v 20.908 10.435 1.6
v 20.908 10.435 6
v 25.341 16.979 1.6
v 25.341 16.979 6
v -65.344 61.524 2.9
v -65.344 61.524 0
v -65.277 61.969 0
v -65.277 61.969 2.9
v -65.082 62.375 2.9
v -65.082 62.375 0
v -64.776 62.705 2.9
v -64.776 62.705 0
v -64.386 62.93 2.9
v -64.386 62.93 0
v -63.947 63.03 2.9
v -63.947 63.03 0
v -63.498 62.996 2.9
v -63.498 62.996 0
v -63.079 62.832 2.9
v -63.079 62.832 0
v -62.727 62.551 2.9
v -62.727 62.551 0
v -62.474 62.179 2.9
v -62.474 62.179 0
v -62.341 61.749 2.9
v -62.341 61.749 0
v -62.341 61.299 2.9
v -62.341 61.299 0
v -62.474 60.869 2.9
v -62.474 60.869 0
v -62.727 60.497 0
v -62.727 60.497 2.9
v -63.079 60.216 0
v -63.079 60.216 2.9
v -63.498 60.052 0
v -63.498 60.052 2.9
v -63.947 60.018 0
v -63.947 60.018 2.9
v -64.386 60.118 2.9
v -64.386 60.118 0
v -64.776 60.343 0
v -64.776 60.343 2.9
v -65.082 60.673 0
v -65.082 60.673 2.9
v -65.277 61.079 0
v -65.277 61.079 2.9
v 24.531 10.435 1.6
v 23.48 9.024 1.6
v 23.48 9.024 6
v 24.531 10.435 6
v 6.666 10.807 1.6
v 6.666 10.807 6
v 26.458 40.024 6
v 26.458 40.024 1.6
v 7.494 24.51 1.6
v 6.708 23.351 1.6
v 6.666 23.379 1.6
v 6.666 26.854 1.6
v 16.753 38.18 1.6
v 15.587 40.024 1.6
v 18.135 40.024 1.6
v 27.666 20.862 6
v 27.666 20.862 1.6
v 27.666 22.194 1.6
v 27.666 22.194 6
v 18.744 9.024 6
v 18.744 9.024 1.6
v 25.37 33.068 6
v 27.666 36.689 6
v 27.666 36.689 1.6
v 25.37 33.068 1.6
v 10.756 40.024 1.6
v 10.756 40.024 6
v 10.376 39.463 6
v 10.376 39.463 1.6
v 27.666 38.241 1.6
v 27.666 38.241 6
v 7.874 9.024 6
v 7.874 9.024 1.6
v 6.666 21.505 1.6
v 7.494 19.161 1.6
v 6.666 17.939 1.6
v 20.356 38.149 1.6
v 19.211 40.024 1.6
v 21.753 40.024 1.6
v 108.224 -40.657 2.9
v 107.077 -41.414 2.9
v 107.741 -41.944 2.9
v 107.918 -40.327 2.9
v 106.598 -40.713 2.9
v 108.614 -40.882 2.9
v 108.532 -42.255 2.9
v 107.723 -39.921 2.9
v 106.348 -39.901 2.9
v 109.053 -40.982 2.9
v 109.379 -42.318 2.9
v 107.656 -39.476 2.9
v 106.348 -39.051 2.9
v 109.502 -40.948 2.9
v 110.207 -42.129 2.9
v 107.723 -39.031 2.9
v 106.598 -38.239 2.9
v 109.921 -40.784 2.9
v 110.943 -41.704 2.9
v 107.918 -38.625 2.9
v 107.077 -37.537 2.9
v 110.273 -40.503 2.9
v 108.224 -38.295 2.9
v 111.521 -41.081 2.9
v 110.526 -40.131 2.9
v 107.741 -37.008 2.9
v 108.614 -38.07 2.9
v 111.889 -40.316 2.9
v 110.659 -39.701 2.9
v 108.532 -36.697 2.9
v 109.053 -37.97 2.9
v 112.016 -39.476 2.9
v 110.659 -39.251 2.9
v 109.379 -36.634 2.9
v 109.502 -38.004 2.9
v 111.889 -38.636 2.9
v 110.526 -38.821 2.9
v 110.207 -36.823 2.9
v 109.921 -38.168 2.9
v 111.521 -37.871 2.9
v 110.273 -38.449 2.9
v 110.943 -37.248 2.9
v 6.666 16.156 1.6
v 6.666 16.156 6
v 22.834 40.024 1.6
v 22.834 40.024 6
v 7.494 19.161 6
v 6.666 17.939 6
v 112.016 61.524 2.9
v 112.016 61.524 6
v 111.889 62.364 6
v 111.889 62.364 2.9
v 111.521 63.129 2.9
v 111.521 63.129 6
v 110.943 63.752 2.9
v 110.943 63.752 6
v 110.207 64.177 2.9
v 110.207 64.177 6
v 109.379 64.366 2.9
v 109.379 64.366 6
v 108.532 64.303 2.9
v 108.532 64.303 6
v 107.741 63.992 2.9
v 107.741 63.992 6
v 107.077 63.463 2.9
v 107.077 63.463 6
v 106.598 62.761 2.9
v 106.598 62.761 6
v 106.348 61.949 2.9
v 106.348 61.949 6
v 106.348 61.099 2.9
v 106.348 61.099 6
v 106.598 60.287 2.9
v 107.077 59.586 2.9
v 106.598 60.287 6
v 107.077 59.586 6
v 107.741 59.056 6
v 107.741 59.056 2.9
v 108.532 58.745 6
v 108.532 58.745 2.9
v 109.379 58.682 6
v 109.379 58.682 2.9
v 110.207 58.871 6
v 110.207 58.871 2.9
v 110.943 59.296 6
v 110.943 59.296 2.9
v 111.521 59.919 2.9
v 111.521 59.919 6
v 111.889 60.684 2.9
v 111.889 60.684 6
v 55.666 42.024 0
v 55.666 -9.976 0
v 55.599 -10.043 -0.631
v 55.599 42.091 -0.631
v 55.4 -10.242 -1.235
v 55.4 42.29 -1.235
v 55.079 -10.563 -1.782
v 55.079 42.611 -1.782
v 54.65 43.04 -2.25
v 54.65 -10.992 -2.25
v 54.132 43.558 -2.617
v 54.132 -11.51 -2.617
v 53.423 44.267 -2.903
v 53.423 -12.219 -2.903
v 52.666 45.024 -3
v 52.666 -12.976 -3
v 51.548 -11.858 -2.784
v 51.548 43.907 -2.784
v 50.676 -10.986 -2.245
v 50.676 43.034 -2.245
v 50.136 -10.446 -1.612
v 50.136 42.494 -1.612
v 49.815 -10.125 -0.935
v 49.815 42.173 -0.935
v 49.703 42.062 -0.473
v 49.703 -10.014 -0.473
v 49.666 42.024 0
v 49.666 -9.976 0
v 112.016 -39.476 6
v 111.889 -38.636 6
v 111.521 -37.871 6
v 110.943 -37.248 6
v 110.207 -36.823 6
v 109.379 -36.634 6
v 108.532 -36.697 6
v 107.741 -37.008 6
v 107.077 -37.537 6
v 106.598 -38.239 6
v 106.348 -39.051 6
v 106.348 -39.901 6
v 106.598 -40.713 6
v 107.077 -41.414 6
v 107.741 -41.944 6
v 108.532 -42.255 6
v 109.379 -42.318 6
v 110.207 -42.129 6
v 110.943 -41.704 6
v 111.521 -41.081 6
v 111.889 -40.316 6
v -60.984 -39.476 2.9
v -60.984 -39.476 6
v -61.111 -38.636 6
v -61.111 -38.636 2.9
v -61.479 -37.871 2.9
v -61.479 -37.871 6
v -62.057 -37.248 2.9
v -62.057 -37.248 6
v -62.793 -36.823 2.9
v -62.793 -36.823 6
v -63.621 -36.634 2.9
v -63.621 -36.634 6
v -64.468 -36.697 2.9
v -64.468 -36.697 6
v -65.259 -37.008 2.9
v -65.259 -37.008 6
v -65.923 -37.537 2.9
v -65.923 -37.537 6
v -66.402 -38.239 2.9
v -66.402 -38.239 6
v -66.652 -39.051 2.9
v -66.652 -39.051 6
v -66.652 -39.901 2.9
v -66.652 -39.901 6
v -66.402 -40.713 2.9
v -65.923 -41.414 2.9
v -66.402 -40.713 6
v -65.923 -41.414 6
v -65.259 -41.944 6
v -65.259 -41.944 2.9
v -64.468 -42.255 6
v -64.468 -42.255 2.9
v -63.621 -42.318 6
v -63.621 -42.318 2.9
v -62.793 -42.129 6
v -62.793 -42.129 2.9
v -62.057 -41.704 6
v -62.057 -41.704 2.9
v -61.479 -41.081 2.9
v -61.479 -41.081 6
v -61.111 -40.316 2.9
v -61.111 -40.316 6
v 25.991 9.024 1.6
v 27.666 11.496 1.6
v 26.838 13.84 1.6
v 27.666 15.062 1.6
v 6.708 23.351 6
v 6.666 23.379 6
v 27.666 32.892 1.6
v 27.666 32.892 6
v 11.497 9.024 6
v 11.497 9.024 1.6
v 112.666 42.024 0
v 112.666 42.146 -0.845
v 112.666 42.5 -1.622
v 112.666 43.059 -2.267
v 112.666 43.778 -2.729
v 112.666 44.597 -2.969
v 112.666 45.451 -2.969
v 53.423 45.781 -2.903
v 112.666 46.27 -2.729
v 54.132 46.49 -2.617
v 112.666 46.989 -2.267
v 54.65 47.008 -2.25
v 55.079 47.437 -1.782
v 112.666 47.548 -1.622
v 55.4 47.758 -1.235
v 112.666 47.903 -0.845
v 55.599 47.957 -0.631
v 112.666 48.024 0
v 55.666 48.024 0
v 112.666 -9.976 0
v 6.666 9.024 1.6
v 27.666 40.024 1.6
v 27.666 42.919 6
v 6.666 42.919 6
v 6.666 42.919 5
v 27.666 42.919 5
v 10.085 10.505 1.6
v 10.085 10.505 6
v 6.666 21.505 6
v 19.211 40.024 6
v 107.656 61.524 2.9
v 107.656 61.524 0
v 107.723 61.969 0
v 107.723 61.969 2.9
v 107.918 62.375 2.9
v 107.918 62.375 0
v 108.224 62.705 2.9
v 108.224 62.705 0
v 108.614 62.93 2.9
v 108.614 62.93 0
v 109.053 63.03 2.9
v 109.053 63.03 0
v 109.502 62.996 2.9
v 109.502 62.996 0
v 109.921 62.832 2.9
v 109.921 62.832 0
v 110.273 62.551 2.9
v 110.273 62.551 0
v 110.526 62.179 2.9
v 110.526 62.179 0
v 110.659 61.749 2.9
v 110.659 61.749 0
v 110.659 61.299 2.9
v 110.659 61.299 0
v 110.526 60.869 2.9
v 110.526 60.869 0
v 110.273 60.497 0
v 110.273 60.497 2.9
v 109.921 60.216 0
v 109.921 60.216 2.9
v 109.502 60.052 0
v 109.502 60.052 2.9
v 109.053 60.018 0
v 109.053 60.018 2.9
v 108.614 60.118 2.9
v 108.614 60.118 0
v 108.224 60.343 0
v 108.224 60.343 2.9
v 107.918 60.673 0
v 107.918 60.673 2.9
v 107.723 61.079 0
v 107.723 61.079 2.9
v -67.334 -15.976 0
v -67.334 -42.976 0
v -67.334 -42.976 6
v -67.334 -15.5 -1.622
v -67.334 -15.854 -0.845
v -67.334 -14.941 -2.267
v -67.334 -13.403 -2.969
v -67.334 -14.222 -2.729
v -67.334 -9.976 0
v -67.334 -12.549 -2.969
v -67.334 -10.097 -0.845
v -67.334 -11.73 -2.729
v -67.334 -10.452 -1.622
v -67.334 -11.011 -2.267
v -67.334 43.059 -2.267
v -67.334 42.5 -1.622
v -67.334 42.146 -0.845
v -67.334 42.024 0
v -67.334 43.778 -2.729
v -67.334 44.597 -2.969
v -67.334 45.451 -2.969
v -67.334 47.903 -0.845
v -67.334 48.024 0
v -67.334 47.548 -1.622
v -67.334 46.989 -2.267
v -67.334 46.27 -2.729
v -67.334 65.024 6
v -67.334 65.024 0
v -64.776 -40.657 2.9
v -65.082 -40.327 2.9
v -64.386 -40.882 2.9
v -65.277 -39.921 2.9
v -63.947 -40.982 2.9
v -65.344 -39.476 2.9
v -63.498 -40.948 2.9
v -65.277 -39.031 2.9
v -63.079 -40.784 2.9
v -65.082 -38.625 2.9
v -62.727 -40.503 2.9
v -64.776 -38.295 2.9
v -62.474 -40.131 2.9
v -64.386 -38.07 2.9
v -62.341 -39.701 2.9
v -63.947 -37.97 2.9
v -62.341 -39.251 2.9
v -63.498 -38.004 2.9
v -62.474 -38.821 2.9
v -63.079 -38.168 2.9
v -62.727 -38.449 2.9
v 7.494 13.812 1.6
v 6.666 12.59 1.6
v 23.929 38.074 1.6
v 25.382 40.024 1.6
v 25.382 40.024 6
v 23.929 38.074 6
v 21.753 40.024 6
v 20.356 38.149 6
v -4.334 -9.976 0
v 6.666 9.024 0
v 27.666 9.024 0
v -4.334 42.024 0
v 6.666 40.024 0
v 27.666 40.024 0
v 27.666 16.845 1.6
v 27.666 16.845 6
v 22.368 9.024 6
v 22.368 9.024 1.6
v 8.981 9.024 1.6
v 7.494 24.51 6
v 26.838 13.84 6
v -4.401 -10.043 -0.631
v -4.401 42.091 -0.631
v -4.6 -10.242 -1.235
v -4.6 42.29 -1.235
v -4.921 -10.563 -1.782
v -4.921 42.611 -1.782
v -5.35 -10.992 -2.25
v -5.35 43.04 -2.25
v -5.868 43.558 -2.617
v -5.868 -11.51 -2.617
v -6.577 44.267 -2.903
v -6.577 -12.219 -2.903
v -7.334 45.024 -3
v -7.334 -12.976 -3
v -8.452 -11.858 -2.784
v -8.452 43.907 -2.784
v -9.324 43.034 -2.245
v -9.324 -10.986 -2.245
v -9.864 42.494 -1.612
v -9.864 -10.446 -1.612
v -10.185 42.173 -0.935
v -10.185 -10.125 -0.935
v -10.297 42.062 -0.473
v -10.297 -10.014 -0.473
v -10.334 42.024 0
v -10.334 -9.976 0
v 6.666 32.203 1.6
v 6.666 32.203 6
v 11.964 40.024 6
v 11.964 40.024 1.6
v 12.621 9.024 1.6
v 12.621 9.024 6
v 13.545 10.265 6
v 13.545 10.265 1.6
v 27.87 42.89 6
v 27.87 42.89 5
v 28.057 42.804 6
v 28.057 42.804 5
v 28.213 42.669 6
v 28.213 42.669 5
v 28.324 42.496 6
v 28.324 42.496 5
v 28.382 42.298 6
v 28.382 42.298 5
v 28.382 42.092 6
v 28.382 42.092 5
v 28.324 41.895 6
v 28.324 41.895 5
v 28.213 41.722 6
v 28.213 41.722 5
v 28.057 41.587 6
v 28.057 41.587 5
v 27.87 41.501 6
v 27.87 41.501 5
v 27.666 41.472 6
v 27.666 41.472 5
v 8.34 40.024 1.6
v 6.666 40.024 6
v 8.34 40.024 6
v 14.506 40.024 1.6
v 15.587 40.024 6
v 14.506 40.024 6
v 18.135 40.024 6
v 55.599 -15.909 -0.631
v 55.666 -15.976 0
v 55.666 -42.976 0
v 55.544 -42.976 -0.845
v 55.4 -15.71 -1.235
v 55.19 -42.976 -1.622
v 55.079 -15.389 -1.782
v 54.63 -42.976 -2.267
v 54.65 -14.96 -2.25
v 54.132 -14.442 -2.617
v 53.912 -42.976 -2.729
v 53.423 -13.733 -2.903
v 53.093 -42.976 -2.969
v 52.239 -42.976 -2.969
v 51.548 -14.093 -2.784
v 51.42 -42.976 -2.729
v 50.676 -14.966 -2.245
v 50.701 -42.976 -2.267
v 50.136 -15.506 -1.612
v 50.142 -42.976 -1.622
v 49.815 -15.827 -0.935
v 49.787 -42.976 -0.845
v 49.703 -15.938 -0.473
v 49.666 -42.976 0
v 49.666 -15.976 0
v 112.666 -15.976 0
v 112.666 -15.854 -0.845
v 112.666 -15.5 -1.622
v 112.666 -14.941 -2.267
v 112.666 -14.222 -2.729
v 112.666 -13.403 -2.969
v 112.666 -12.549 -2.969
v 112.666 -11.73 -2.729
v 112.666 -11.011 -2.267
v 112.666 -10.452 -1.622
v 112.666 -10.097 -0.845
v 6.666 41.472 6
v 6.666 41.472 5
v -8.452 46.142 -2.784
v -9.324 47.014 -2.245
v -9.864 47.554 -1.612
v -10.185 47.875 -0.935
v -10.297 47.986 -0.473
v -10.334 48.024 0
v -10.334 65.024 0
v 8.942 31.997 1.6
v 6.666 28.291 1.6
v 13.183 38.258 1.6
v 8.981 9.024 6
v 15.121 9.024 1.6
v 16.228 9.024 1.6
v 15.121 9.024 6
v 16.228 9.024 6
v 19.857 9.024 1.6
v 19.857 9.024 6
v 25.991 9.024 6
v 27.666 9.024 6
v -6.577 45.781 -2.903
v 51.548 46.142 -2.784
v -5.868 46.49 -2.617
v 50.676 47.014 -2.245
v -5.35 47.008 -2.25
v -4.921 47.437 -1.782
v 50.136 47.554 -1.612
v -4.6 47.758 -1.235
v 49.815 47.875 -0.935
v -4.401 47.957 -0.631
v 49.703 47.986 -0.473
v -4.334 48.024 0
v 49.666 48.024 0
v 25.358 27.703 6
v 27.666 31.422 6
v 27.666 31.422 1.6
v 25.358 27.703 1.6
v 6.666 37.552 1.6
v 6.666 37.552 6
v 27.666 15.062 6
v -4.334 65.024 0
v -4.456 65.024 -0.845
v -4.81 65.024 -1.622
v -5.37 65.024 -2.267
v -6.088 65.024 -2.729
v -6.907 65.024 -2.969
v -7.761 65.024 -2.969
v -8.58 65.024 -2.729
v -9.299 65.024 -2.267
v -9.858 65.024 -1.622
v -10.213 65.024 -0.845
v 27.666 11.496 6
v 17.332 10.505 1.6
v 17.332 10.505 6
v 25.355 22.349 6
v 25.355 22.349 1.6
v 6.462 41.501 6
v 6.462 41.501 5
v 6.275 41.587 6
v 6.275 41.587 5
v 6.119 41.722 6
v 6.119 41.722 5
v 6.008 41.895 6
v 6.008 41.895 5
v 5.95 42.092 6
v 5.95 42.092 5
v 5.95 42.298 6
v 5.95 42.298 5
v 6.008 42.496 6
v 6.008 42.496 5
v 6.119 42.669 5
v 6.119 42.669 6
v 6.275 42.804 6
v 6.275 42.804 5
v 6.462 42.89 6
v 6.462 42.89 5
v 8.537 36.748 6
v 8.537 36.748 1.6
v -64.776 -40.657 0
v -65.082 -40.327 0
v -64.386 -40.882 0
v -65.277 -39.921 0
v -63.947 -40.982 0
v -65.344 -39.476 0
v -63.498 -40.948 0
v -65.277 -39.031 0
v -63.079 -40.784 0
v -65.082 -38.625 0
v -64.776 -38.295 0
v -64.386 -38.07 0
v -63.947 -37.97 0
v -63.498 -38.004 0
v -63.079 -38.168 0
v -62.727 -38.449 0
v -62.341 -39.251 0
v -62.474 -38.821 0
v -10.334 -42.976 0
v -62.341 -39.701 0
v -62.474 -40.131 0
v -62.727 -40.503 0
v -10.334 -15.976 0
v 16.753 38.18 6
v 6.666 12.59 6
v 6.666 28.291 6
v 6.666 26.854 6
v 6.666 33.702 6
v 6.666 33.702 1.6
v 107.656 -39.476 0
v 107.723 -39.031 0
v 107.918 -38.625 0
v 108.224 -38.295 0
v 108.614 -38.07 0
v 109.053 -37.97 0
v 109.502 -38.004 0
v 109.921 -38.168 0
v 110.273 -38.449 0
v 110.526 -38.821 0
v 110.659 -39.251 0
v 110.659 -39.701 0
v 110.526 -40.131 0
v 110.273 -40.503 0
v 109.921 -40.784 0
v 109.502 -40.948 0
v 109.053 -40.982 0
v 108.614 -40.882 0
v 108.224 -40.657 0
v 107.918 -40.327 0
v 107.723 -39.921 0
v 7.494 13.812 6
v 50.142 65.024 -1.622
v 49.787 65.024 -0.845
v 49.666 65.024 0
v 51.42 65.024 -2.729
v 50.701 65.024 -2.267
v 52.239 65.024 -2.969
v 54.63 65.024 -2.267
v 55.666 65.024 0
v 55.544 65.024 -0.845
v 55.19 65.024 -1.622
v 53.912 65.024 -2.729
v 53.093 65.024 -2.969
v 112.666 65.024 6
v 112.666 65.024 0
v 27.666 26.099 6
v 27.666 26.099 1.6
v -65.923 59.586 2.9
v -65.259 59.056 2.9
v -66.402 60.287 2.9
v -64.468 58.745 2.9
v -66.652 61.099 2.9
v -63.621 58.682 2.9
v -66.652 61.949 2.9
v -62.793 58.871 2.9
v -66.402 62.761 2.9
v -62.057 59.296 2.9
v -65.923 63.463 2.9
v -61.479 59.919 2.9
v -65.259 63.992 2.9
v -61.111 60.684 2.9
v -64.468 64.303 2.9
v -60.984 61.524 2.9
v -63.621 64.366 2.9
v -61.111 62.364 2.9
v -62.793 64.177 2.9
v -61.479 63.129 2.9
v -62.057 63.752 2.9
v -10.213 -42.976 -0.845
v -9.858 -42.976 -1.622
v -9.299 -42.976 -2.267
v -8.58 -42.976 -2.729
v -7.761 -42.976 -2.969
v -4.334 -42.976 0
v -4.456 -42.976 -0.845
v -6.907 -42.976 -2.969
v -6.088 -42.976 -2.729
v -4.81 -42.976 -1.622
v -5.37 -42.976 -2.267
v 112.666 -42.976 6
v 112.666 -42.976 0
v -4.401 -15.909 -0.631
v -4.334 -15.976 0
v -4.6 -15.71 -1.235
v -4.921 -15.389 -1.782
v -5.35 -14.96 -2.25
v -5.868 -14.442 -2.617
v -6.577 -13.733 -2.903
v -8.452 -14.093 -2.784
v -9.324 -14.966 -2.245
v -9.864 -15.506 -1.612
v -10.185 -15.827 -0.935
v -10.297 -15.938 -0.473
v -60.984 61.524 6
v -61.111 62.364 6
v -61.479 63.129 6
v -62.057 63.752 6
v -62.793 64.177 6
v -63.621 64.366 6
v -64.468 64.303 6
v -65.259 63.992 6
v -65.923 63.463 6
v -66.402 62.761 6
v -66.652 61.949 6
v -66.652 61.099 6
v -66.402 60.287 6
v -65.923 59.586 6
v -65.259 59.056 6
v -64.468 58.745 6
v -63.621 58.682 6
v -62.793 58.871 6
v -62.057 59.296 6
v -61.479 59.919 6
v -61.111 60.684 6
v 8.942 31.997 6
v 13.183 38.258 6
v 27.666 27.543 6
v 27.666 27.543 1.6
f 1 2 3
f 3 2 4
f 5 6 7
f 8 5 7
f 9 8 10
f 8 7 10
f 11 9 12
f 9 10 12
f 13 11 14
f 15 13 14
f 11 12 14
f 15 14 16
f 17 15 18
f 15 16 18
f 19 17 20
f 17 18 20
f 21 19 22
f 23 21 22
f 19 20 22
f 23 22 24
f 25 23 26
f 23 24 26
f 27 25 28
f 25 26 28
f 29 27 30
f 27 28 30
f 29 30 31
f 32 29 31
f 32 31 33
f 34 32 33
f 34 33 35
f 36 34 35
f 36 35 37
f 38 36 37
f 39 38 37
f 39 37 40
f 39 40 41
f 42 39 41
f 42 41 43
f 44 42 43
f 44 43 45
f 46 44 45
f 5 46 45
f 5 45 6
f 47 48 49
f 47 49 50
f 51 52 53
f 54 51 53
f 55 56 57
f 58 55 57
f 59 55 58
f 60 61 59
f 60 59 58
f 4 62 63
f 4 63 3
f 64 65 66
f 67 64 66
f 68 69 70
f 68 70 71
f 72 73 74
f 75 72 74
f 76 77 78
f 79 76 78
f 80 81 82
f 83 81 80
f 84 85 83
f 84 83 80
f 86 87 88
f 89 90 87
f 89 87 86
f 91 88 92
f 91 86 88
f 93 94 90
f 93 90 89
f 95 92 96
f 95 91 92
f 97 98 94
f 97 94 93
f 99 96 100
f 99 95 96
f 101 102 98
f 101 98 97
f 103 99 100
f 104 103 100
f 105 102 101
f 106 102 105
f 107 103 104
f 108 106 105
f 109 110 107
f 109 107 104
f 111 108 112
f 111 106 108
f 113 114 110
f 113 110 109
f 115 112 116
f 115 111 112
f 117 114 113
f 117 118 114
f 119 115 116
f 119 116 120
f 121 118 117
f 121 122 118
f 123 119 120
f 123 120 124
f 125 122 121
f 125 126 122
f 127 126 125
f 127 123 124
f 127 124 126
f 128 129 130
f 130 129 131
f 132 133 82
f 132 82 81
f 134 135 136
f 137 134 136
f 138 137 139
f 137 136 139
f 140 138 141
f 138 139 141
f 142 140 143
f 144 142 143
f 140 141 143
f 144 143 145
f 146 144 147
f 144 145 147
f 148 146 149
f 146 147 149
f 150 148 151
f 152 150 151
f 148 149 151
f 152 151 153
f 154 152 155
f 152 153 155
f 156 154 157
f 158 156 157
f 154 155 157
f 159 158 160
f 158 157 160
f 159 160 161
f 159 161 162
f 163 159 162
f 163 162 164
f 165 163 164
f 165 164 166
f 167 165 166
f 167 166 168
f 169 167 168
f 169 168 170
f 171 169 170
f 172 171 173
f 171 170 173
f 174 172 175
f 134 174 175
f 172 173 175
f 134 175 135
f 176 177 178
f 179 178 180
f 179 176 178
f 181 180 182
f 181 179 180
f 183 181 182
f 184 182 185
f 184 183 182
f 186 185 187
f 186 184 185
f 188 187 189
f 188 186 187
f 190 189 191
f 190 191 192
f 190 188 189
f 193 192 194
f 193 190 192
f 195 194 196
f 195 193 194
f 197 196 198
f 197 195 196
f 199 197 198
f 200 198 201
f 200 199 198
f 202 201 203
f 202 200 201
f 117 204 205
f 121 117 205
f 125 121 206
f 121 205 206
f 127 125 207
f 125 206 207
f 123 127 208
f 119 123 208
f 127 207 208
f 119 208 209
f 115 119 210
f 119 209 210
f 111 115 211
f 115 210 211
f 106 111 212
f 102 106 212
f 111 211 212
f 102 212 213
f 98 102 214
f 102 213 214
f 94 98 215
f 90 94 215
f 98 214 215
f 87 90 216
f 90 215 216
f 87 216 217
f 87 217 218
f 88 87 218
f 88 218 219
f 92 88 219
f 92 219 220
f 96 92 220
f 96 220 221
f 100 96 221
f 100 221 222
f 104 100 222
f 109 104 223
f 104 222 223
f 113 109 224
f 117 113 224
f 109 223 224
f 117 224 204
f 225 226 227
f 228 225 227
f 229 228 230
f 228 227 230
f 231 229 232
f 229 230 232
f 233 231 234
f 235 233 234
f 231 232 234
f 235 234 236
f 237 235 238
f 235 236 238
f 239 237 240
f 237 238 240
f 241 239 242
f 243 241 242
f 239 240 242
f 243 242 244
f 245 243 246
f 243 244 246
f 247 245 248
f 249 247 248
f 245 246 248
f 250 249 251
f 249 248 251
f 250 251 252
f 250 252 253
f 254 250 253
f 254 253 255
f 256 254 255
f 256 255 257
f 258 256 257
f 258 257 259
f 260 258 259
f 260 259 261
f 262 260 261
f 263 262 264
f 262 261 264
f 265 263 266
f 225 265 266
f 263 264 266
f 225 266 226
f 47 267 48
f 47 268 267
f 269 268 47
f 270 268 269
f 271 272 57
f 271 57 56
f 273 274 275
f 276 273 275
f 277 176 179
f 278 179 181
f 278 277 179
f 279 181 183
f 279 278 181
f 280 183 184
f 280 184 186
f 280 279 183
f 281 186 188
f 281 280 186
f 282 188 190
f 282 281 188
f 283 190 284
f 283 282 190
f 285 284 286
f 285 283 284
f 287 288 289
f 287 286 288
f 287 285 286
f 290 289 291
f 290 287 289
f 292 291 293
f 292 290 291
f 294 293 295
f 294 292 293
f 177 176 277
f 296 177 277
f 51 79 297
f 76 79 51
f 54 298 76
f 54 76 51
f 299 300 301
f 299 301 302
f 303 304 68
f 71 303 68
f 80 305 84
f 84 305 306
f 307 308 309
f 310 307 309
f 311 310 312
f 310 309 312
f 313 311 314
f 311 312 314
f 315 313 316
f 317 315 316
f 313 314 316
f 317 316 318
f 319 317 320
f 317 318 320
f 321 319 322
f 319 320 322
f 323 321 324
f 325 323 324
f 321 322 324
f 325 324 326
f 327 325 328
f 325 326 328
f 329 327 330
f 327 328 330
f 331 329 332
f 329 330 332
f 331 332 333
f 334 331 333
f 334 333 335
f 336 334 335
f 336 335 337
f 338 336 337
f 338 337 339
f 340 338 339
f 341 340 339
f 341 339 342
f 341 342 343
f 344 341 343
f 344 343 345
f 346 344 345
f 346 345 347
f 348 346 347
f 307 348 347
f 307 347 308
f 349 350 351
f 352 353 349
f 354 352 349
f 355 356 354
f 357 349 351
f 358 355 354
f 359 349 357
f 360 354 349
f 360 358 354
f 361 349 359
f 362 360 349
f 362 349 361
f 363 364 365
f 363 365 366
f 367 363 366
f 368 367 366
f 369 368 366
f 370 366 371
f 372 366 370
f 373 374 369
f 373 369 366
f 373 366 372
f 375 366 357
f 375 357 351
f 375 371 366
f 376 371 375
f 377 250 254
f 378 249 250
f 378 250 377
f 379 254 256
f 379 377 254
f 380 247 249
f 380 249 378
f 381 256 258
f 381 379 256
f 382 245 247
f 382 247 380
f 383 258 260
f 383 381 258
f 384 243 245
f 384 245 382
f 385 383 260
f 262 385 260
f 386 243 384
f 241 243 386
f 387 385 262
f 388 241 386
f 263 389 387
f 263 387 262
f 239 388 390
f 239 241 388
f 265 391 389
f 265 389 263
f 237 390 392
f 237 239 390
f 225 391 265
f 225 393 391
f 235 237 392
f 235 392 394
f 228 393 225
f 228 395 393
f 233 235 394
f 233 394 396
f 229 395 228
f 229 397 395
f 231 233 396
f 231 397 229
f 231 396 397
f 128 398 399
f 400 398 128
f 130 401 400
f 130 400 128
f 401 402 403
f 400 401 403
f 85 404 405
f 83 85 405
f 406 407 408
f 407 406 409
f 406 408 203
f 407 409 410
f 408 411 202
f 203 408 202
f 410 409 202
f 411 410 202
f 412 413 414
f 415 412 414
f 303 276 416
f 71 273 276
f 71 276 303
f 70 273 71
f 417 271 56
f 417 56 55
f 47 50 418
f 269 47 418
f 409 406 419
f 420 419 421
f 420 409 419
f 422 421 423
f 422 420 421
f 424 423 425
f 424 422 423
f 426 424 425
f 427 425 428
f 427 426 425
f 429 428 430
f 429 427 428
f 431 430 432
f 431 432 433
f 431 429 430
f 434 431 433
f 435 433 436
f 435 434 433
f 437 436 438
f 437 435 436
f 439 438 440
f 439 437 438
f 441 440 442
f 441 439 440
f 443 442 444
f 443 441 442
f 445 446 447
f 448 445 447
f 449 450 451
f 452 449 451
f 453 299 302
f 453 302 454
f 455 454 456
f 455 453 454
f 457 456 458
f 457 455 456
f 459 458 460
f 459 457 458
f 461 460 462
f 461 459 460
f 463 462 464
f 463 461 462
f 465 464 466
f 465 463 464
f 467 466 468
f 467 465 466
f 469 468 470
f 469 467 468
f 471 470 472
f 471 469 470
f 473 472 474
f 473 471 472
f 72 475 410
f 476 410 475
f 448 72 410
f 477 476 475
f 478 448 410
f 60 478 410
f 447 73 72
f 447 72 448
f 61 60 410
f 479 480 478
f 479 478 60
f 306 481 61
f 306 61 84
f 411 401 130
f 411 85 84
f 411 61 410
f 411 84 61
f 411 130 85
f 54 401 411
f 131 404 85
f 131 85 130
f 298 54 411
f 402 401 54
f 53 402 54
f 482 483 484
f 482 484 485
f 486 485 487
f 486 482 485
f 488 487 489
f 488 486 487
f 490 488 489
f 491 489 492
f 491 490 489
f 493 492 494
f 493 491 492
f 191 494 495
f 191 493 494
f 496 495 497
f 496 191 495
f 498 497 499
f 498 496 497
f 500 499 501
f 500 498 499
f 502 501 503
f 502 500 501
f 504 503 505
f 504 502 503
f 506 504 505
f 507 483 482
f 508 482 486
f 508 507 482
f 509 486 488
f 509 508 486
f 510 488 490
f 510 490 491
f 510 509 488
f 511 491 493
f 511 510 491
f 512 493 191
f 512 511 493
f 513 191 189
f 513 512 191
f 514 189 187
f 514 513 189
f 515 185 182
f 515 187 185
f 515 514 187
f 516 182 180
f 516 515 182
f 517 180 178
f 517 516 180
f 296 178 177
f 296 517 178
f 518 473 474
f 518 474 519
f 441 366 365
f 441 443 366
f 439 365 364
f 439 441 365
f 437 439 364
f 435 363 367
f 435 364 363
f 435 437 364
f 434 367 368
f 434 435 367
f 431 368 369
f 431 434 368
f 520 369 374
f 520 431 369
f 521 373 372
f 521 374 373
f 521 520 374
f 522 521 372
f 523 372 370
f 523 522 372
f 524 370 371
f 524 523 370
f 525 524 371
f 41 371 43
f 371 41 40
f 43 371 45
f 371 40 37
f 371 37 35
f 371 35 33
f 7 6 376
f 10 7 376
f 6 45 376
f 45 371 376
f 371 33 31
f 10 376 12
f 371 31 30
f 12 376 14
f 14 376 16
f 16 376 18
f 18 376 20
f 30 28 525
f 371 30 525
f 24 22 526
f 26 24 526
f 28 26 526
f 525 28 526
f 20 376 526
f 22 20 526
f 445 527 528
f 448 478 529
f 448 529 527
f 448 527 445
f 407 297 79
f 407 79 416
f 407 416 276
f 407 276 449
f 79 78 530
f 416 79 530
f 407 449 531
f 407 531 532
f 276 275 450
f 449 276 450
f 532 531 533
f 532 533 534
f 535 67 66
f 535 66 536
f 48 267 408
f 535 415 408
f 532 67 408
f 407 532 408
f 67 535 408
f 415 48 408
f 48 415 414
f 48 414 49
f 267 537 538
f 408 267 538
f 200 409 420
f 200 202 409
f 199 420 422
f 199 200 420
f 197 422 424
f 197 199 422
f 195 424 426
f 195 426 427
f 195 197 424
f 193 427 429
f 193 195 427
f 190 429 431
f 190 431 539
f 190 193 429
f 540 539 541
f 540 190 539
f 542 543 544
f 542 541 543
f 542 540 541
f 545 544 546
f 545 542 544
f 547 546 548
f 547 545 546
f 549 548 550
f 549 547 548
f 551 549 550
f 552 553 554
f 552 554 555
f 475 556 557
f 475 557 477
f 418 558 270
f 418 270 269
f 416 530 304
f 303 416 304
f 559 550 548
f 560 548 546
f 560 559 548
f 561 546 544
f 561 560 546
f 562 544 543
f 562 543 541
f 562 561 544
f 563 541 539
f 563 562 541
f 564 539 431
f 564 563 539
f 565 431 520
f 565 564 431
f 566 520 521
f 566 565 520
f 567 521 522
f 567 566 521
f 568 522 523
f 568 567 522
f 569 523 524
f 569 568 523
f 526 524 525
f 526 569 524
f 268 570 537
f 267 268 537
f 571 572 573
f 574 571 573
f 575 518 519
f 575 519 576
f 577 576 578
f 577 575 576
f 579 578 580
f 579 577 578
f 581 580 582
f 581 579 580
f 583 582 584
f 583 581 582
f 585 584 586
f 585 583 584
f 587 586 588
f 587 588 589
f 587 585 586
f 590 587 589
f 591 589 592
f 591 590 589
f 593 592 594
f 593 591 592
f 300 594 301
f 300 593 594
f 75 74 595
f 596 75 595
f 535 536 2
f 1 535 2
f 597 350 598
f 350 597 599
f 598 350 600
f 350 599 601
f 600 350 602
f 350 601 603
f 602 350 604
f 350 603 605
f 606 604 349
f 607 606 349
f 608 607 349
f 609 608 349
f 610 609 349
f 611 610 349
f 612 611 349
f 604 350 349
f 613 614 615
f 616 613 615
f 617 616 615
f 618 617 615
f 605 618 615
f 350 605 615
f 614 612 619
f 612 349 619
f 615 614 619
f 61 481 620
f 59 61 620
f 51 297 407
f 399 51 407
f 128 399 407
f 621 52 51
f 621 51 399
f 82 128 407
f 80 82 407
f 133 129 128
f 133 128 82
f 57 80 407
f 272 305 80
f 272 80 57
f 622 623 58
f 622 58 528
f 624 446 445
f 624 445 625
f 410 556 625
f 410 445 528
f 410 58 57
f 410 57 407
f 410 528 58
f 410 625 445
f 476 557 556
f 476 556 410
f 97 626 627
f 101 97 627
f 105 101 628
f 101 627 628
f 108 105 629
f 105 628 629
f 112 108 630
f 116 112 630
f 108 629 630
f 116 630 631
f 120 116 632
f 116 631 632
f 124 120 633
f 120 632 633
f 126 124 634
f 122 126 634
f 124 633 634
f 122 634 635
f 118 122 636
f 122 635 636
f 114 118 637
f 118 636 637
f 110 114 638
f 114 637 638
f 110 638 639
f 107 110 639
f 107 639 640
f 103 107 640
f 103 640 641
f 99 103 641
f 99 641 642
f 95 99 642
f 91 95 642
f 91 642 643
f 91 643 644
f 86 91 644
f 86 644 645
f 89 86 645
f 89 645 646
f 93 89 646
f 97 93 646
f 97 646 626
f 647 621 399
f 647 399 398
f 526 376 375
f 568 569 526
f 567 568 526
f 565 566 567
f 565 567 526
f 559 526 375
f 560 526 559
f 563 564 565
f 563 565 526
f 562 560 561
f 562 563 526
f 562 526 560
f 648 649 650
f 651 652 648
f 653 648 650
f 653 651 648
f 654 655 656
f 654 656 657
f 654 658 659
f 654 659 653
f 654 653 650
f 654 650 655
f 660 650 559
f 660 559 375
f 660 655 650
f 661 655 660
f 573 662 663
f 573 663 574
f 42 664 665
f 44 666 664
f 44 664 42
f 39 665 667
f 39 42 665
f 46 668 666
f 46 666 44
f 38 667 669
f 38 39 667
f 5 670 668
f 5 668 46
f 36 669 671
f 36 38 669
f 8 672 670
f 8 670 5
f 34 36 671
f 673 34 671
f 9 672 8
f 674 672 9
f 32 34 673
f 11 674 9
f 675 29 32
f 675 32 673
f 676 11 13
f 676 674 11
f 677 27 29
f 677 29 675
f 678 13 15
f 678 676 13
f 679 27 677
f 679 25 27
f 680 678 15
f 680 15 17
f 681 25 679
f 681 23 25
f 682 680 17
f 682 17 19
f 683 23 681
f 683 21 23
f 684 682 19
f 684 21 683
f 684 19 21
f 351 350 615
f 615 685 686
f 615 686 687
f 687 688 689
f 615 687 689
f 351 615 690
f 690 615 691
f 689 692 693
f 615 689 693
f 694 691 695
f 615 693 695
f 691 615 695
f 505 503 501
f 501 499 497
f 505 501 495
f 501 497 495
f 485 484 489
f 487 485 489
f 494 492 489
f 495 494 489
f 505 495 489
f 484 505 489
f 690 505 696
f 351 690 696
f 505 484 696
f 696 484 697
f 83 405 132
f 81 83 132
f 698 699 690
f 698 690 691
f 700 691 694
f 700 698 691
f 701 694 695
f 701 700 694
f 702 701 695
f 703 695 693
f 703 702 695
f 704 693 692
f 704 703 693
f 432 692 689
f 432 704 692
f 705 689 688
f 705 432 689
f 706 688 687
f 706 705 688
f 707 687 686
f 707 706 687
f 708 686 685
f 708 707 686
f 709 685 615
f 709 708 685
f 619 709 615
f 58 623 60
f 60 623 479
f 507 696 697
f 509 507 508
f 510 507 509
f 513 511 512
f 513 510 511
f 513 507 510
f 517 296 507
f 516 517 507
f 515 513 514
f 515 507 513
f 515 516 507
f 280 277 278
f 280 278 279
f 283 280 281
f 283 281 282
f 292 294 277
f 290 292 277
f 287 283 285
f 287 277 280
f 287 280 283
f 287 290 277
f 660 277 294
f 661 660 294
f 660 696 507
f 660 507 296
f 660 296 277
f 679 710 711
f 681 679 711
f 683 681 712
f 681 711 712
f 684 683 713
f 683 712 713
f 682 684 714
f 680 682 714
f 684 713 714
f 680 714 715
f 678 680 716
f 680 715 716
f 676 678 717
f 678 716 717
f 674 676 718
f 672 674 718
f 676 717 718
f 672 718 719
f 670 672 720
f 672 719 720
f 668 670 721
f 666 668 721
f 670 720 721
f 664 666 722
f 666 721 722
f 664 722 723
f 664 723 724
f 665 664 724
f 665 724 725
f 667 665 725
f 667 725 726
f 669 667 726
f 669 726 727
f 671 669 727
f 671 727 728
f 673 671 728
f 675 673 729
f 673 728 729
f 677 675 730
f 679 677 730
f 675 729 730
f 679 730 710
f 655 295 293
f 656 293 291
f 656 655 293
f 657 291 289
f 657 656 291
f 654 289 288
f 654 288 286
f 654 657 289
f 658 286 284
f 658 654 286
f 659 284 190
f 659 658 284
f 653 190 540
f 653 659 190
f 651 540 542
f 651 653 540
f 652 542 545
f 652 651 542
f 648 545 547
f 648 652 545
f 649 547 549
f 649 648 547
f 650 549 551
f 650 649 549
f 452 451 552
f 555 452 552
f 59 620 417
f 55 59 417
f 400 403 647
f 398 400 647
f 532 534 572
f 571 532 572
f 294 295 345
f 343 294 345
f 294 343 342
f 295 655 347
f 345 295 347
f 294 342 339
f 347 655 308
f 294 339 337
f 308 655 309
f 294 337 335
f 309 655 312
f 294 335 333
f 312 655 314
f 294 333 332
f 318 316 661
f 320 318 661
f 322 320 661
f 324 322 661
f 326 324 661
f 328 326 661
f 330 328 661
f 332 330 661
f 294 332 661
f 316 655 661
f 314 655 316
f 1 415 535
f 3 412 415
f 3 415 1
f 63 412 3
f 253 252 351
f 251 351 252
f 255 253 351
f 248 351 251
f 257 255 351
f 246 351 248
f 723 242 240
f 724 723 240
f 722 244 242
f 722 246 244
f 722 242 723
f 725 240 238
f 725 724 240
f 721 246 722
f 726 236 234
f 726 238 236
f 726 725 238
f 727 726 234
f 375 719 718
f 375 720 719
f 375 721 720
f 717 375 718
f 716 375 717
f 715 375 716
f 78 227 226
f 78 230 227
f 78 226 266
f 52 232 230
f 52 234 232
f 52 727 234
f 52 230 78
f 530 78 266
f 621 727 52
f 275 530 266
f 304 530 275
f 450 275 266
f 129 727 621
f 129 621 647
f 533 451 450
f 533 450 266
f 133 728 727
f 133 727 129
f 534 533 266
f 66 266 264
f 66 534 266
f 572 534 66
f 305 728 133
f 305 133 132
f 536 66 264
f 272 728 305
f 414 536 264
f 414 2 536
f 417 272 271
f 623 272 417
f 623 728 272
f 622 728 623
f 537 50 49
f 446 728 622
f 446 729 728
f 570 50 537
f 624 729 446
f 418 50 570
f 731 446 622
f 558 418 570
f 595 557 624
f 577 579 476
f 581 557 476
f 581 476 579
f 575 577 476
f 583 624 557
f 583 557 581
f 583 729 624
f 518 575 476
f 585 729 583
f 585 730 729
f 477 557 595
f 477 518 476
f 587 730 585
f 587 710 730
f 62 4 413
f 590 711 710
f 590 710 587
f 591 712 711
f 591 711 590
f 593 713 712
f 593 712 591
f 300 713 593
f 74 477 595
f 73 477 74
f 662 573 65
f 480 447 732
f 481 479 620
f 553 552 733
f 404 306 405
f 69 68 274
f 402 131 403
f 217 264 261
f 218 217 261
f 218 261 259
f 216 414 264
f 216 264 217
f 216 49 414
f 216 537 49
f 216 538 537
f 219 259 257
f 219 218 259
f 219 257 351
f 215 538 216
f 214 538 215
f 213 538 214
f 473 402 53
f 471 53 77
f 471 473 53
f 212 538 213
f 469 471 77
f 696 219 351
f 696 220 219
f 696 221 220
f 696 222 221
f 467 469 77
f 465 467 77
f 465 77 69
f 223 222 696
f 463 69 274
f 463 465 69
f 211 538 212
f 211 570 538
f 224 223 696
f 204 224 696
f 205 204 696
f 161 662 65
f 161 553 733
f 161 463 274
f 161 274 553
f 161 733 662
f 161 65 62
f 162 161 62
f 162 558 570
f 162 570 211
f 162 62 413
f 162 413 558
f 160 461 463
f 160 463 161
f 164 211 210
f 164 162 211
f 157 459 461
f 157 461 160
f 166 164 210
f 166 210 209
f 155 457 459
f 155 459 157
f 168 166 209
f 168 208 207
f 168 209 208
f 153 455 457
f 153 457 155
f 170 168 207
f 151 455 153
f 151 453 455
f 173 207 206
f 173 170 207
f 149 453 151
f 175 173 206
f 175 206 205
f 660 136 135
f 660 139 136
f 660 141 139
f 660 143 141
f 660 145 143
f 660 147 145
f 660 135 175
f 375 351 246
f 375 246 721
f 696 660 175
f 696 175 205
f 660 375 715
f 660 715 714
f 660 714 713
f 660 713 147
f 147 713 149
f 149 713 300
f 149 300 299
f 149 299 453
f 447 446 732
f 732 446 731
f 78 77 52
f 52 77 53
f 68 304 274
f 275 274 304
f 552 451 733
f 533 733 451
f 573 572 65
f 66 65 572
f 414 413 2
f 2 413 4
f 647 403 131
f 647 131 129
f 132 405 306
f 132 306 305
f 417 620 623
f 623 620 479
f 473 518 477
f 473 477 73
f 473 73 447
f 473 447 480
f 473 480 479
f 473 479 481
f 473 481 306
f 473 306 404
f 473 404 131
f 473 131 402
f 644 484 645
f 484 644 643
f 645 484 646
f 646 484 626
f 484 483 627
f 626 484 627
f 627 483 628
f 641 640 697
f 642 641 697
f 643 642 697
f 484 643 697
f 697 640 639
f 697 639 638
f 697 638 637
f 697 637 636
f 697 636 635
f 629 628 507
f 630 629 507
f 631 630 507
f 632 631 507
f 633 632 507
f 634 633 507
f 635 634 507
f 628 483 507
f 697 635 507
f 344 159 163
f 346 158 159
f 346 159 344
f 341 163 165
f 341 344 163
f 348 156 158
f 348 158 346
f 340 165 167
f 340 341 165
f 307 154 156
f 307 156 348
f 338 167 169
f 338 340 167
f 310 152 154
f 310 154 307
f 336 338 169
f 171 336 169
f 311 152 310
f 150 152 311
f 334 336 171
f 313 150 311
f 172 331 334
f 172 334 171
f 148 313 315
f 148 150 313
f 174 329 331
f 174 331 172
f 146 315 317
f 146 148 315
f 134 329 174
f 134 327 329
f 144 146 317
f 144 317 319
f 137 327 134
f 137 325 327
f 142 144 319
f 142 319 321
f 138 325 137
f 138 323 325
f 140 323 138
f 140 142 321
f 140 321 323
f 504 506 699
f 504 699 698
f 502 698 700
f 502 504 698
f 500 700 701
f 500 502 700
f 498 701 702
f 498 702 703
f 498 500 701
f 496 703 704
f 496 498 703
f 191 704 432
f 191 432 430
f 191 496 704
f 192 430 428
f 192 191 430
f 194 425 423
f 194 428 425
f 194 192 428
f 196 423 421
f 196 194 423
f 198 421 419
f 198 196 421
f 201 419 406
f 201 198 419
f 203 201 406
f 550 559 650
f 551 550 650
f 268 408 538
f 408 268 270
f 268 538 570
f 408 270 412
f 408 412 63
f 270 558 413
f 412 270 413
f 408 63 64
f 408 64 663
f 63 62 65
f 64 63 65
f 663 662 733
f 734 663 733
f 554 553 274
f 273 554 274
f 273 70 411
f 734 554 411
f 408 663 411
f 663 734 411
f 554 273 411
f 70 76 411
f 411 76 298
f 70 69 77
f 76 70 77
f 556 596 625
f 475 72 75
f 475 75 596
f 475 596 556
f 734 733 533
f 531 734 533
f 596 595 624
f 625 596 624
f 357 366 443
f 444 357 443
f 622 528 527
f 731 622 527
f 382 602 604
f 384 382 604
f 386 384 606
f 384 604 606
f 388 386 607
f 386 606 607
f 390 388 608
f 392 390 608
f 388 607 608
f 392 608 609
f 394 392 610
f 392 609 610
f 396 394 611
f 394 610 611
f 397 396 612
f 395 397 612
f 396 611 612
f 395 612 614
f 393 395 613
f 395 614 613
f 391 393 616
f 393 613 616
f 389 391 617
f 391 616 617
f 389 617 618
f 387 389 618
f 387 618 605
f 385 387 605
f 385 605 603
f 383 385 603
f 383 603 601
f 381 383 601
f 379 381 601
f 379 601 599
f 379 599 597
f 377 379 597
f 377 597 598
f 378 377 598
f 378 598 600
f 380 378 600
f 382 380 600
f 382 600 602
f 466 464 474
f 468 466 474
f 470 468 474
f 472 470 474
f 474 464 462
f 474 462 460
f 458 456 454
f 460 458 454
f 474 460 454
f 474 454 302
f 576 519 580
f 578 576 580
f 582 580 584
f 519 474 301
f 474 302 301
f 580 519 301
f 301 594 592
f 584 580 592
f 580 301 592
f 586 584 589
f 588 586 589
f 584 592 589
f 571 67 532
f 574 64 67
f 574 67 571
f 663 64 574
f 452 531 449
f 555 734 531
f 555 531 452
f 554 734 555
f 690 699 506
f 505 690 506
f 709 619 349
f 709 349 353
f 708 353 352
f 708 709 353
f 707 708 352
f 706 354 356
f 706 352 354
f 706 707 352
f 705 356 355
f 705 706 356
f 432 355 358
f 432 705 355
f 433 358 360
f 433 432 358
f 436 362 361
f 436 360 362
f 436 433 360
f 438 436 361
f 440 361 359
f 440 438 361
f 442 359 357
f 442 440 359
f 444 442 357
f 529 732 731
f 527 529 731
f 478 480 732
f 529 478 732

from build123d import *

# Parameters (mm, degrees)
SKETCH_1_W           = 180
SKETCH_1_H           = 108
EXTRUDE_4_DEPTH      = 6
SKETCH_3_R           = 2.85
EXTRUDE_8_DEPTH      = 5.7
SKETCH_4_R           = 2.85
EXTRUDE_9_DEPTH      = 3.1
SKETCH_5_R           = 2.85
CUT_EXTRUDE_1_DEPTH  = 3.1
SKETCH_7_R           = 2.85
CUT_EXTRUDE_2_DEPTH  = 3.1
SKETCH_8_R           = 2.85
CUT_EXTRUDE_3_DEPTH  = 3.1
SKETCH_9_R           = 2.85
CUT_EXTRUDE_4_DEPTH  = 3.1
SKETCH_10_R          = 1.51
CUT_EXTRUDE_5_DEPTH  = 3.1
SKETCH_11_R          = 1.51
CUT_EXTRUDE_6_DEPTH  = 3.1
SKETCH_12_R          = 1.51
CUT_EXTRUDE_7_DEPTH  = 3.1
SKETCH_13_R          = 1.51
CUT_EXTRUDE_8_DEPTH  = 3.1
SKETCH_14_W          = 21
SKETCH_14_H          = 31
CUT_EXTRUDE_10_DEPTH = 10
CUT_EXTRUDE_12_DEPTH = 1
EXTRUDE_10_DEPTH     = 4.4
EXTRUDE_12_DEPTH     = 4.4
SKETCH_18_R          = 3
EXTRUDE_15_DEPTH     = 108
SKETCH_21_R          = 3
EXTRUDE_16_DEPTH     = 180


with BuildPart() as part:
    # 草图1 → 凸台-拉伸4 (new body)
    with BuildSketch(Plane.XY):
        with Locations((22.665747166, 11.024023211)):
            Rectangle(SKETCH_1_W, SKETCH_1_H)
    extrude(amount=EXTRUDE_4_DEPTH)

    # 草图3 → 凸台-拉伸8 (add)
    with BuildSketch(Plane.XY.offset(6)):
        with Locations((109.165747166, 61.524023211)):
            Circle(SKETCH_3_R)
    extrude(amount=-EXTRUDE_8_DEPTH)

    # 草图4 → 凸台-拉伸9 (add)
    with BuildSketch(Plane.XY.offset(6)):
        with Locations((-63.834252834, 61.524023211)):
            Circle(SKETCH_4_R)
    extrude(amount=-EXTRUDE_9_DEPTH)

    # 草图5 → 切除-拉伸1 (cut)
    with BuildSketch(Plane.XY.offset(6)):
        with Locations((-63.834252834, 61.524023211)):
            Circle(SKETCH_5_R)
    extrude(amount=-CUT_EXTRUDE_1_DEPTH, mode=Mode.SUBTRACT)

    # 草图7 → 切除-拉伸2 (cut)
    with BuildSketch(Plane.XY.offset(6)):
        with Locations((109.165747166, 61.524023211)):
            Circle(SKETCH_7_R)
    extrude(amount=-CUT_EXTRUDE_2_DEPTH, mode=Mode.SUBTRACT)

    # 草图8 → 切除-拉伸3 (cut)
    with BuildSketch(Plane.XY.offset(6)):
        with Locations((-63.834252834, -39.475976789)):
            Circle(SKETCH_8_R)
    extrude(amount=-CUT_EXTRUDE_3_DEPTH, mode=Mode.SUBTRACT)

    # 草图9 → 切除-拉伸4 (cut)
    with BuildSketch(Plane.XY.offset(6)):
        with Locations((109.165747166, -39.475976789)):
            Circle(SKETCH_9_R)
    extrude(amount=-CUT_EXTRUDE_4_DEPTH, mode=Mode.SUBTRACT)

    # 草图10 → 切除-拉伸5 (cut)
    with BuildSketch(Plane(origin=(0, 0, 0), x_dir=(-1, 0, 0), z_dir=(0, 0, -1))):
        with Locations((-109.165747166, 61.524023211)):
            Circle(SKETCH_10_R)
    extrude(amount=-CUT_EXTRUDE_5_DEPTH, mode=Mode.SUBTRACT)

    # 草图11 → 切除-拉伸6 (cut)
    with BuildSketch(Plane(origin=(0, 0, 0), x_dir=(-1, 0, 0), z_dir=(0, 0, -1))):
        with Locations((-109.165747166, -39.475976789)):
            Circle(SKETCH_11_R)
    extrude(amount=-CUT_EXTRUDE_6_DEPTH, mode=Mode.SUBTRACT)

    # 草图12 → 切除-拉伸7 (cut)
    with BuildSketch(Plane(origin=(0, 0, 0), x_dir=(-1, 0, 0), z_dir=(0, 0, -1))):
        with Locations((63.834252834, 61.524023211)):
            Circle(SKETCH_12_R)
    extrude(amount=-CUT_EXTRUDE_7_DEPTH, mode=Mode.SUBTRACT)

    # 草图13 → 切除-拉伸8 (cut)
    with BuildSketch(Plane(origin=(0, 0, 0), x_dir=(-1, 0, 0), z_dir=(0, 0, -1))):
        with Locations((63.834252834, -39.475976789)):
            Circle(SKETCH_13_R)
    extrude(amount=-CUT_EXTRUDE_8_DEPTH, mode=Mode.SUBTRACT)

    # 草图14 → 切除-拉伸10 (cut)
    with BuildSketch(Plane.XY.offset(6)):
        with Locations((17.165747166, 24.524023211)):
            Rectangle(SKETCH_14_W, SKETCH_14_H)
    extrude(amount=-CUT_EXTRUDE_10_DEPTH, mode=Mode.SUBTRACT)

    # 草图15 → 切除-拉伸12 (cut)
    with BuildSketch(Plane.XY.offset(6)):
        with BuildLine():
            Line((6.665747166, 42.91898623), (27.665747166, 42.91898623))
            ThreePointArc((27.665747166, 42.91898623), (28.389350728, 42.195382667), (27.665747166, 41.471779105))
            Line((27.665747166, 41.471779105), (6.665747166, 41.471779105))
            ThreePointArc((6.665747166, 41.471779105), (5.942143603, 42.195382667), (6.665747166, 42.91898623))
        make_face()
    extrude(amount=-CUT_EXTRUDE_12_DEPTH, mode=Mode.SUBTRACT)

    # 草图16 → 凸台-拉伸10 (add)
    with BuildSketch(Plane.XY.offset(6)):
        with BuildLine():
            Line((28.493665856, 39.463175066), (7.493665856, 8.463175066))
            ThreePointArc((7.493665856, 8.463175066), (6.104899021, 8.19610452), (5.837828475, 9.584871356))
            Line((5.837828475, 9.584871356), (26.837828475, 40.584871356))
            ThreePointArc((26.837828475, 40.584871356), (28.226595311, 40.851941901), (28.493665856, 39.463175066))
        make_face()
        with BuildLine():
            Line((24.870121619, 39.463175066), (7.493665856, 13.812216559))
            ThreePointArc((7.493665856, 13.812216559), (6.104899021, 13.545146014), (5.837828475, 14.933912849))
            Line((5.837828475, 14.933912849), (23.214284238, 40.584871356))
            ThreePointArc((23.214284238, 40.584871356), (24.603051073, 40.851941901), (24.870121619, 39.463175066))
        make_face()
        with BuildLine():
            Line((21.246577381, 39.463175066), (7.493665856, 19.161258052))
            ThreePointArc((7.493665856, 19.161258052), (6.104899021, 18.894187507), (5.837828475, 20.282954343))
            Line((5.837828475, 20.282954343), (19.59074, 40.584871356))
            ThreePointArc((19.59074, 40.584871356), (20.979506836, 40.851941901), (21.246577381, 39.463175066))
        make_face()
        with BuildLine():
            Line((17.623033144, 39.463175066), (7.493665856, 24.510299546))
            ThreePointArc((7.493665856, 24.510299546), (6.104899021, 24.243229001), (5.837828475, 25.631995836))
            Line((5.837828475, 25.631995836), (15.967195763, 40.584871356))
            ThreePointArc((15.967195763, 40.584871356), (17.355962599, 40.851941901), (17.623033144, 39.463175066))
        make_face()
        with BuildLine():
            Line((13.975285013, 39.427445509), (7.493665856, 29.859341039))
            ThreePointArc((7.493665856, 29.859341039), (6.104899021, 29.592270494), (5.837828475, 30.98103733))
            Line((5.837828475, 30.98103733), (12.319447632, 40.549141799))
            ThreePointArc((12.319447632, 40.549141799), (13.708214468, 40.816212345), (13.975285013, 39.427445509))
        make_face()
        with BuildLine():
            Line((10.375944669, 39.463175066), (7.493665856, 35.208382533))
            ThreePointArc((7.493665856, 35.208382533), (6.104899021, 34.941311987), (5.837828475, 36.330078823))
            Line((5.837828475, 36.330078823), (8.720107288, 40.584871356))
            ThreePointArc((8.720107288, 40.584871356), (10.108874124, 40.851941901), (10.375944669, 39.463175066))
        make_face()
        with BuildLine():
            Line((28.493665856, 34.114133572), (11.117210094, 8.463175066))
            ThreePointArc((11.117210094, 8.463175066), (9.728443258, 8.19610452), (9.461372713, 9.584871356))
            Line((9.461372713, 9.584871356), (26.837828475, 35.235829863))
            ThreePointArc((26.837828475, 35.235829863), (28.226595311, 35.502900408), (28.493665856, 34.114133572))
        make_face()
        with BuildLine():
            Line((28.493665856, 28.765092079), (14.740754331, 8.463175066))
            ThreePointArc((14.740754331, 8.463175066), (13.351987496, 8.19610452), (13.08491695, 9.584871356))
            Line((13.08491695, 9.584871356), (26.837828475, 29.886788369))
            ThreePointArc((26.837828475, 29.886788369), (28.226595311, 30.153858915), (28.493665856, 28.765092079))
        make_face()
        with BuildLine():
            Line((28.493665856, 18.067009092), (21.839365483, 8.243994256))
            ThreePointArc((21.839365483, 8.243994256), (20.450598648, 7.976923711), (20.183528102, 9.365690546))
            Line((20.183528102, 9.365690546), (26.837828475, 19.188705383))
            ThreePointArc((26.837828475, 19.188705383), (28.226595311, 19.455775928), (28.493665856, 18.067009092))
        make_face()
        with BuildLine():
            Line((28.493665856, 12.717967599), (25.611387044, 8.463175066))
            ThreePointArc((25.611387044, 8.463175066), (24.222620208, 8.19610452), (23.955549663, 9.584871356))
            Line((23.955549663, 9.584871356), (26.837828475, 13.839663889))
            ThreePointArc((26.837828475, 13.839663889), (28.226595311, 14.106734434), (28.493665856, 12.717967599))
        make_face()
        with BuildLine():
            Line((28.493665856, 23.416050586), (18.364298569, 8.463175066))
            ThreePointArc((18.364298569, 8.463175066), (16.975531733, 8.19610452), (16.708461188, 9.584871356))
            Line((16.708461188, 9.584871356), (26.837828475, 24.537746876))
            ThreePointArc((26.837828475, 24.537746876), (28.226595311, 24.804817421), (28.493665856, 23.416050586))
        make_face()
    extrude(amount=-EXTRUDE_10_DEPTH)

    # 草图17 → 凸台-拉伸12 (add)
    with BuildSketch(Plane.XY.offset(6)):
        Polygon((9.291077122, 41.427731587), (10.946914503, 40.306035296), (9.559645246, 38.258161632), (7.903807865, 39.379857922), align=None)
        Polygon((13.049495166, 41.419687565), (14.652090321, 40.219395608), (13.183189483, 38.258161632), (11.580594328, 39.458453588), align=None)
        Polygon((16.598688708, 41.312908479), (18.201283863, 40.112616523), (16.753491495, 38.179565965), (15.15089634, 39.379857922), align=None)
        Polygon((23.799395039, 41.251005631), (25.404854584, 40.05494206), (23.929168948, 38.074149695), (22.323709403, 39.270213267), align=None)
        Polygon((20.294085137, 41.416455751), (21.899544682, 40.220392179), (20.356002546, 38.148516976), (18.750543001, 39.344580548), align=None)
        Polygon((27.059349697, 31.996809719), (29.592825756, 35.991789111), (27.903049923, 37.063385782), (25.369573865, 33.06840639), align=None)
        Polygon((27.059349697, 26.647768225), (29.657516879, 30.835687648), (27.956643474, 31.890902187), (25.358476292, 27.702982765), align=None)
        Polygon((27.059349697, 21.298726732), (29.809729018, 25.762891731), (28.105364864, 26.812953261), (25.354985543, 22.348788261), align=None)
        Polygon((27.059349697, 15.949685239), (29.875638884, 20.653316626), (28.157020256, 21.682335837), (25.340731069, 16.97870445), align=None)
        Polygon((27.400761437, 11.104632504), (30.093714703, 15.079944467), (28.437877322, 16.201640757), (25.744924056, 12.226328794), align=None)
        Polygon((24.34904045, 6.839114616), (22.743580905, 8.035178188), (24.531450984, 10.435011402), (26.136910529, 9.23894783), align=None)
        Polygon((20.616325121, 6.692575775), (19.010865576, 7.888639346), (20.907906746, 10.435011402), (22.513366292, 9.23894783), align=None)
        Polygon((17.217009332, 6.999947538), (15.611549786, 8.196011109), (17.33210575, 10.505489519), (18.937565295, 9.309425947), align=None)
        Polygon((13.752364906, 7.191393443), (12.14690536, 8.387457015), (13.545436794, 10.264686364), (15.15089634, 9.068622793), align=None)
        Polygon((10.142404174, 7.231469503), (8.536944628, 8.427533074), (10.085017275, 10.505489519), (11.69047682, 9.309425947), align=None)
        Polygon((7.407914057, 17.251658231), (4.395376532, 12.804579029), (6.051213913, 11.682882738), (9.063751438, 16.129961941), align=None)
        Polygon((7.235662462, 22.346423561), (4.352783087, 18.090744484), (6.008620468, 16.969048193), (8.891499842, 21.22472727), align=None)
        Polygon((7.235662462, 27.695465054), (5.052244478, 24.472324221), (6.708081859, 23.35062793), (8.891499842, 26.573768764), align=None)
        Polygon((7.235662462, 33.044506547), (4.876433622, 29.202971295), (6.582399671, 28.155274467), (8.94162851, 31.996809719), align=None)
        Polygon((6.83097858, 37.796157549), (8.536944628, 36.74846072), (6.3595402, 33.202990382), (4.653574152, 34.250687211), align=None)
    extrude(amount=-EXTRUDE_12_DEPTH)

    # 草图18 → 凸台-拉伸15 (add)
    with BuildSketch(Plane(origin=(0, 65.024023211, 0), x_dir=(1, 0, 0), z_dir=(0, 1, 0))):
        with Locations((-7.334252834, 0)):
            Circle(SKETCH_18_R)
        with Locations((52.665747166, 0)):
            Circle(SKETCH_18_R)
    extrude(amount=-EXTRUDE_15_DEPTH)

    # 草图21 → 凸台-拉伸16 (add)
    with BuildSketch(Plane(origin=(112.665747166, 0, 0), x_dir=(0, 0, -1), z_dir=(1, 0, 0))):
        with Locations((0, -12.975976789)):
            Circle(SKETCH_21_R)
        with Locations((0, 45.024023211)):
            Circle(SKETCH_21_R)
    extrude(amount=-EXTRUDE_16_DEPTH)


solid = part.part
